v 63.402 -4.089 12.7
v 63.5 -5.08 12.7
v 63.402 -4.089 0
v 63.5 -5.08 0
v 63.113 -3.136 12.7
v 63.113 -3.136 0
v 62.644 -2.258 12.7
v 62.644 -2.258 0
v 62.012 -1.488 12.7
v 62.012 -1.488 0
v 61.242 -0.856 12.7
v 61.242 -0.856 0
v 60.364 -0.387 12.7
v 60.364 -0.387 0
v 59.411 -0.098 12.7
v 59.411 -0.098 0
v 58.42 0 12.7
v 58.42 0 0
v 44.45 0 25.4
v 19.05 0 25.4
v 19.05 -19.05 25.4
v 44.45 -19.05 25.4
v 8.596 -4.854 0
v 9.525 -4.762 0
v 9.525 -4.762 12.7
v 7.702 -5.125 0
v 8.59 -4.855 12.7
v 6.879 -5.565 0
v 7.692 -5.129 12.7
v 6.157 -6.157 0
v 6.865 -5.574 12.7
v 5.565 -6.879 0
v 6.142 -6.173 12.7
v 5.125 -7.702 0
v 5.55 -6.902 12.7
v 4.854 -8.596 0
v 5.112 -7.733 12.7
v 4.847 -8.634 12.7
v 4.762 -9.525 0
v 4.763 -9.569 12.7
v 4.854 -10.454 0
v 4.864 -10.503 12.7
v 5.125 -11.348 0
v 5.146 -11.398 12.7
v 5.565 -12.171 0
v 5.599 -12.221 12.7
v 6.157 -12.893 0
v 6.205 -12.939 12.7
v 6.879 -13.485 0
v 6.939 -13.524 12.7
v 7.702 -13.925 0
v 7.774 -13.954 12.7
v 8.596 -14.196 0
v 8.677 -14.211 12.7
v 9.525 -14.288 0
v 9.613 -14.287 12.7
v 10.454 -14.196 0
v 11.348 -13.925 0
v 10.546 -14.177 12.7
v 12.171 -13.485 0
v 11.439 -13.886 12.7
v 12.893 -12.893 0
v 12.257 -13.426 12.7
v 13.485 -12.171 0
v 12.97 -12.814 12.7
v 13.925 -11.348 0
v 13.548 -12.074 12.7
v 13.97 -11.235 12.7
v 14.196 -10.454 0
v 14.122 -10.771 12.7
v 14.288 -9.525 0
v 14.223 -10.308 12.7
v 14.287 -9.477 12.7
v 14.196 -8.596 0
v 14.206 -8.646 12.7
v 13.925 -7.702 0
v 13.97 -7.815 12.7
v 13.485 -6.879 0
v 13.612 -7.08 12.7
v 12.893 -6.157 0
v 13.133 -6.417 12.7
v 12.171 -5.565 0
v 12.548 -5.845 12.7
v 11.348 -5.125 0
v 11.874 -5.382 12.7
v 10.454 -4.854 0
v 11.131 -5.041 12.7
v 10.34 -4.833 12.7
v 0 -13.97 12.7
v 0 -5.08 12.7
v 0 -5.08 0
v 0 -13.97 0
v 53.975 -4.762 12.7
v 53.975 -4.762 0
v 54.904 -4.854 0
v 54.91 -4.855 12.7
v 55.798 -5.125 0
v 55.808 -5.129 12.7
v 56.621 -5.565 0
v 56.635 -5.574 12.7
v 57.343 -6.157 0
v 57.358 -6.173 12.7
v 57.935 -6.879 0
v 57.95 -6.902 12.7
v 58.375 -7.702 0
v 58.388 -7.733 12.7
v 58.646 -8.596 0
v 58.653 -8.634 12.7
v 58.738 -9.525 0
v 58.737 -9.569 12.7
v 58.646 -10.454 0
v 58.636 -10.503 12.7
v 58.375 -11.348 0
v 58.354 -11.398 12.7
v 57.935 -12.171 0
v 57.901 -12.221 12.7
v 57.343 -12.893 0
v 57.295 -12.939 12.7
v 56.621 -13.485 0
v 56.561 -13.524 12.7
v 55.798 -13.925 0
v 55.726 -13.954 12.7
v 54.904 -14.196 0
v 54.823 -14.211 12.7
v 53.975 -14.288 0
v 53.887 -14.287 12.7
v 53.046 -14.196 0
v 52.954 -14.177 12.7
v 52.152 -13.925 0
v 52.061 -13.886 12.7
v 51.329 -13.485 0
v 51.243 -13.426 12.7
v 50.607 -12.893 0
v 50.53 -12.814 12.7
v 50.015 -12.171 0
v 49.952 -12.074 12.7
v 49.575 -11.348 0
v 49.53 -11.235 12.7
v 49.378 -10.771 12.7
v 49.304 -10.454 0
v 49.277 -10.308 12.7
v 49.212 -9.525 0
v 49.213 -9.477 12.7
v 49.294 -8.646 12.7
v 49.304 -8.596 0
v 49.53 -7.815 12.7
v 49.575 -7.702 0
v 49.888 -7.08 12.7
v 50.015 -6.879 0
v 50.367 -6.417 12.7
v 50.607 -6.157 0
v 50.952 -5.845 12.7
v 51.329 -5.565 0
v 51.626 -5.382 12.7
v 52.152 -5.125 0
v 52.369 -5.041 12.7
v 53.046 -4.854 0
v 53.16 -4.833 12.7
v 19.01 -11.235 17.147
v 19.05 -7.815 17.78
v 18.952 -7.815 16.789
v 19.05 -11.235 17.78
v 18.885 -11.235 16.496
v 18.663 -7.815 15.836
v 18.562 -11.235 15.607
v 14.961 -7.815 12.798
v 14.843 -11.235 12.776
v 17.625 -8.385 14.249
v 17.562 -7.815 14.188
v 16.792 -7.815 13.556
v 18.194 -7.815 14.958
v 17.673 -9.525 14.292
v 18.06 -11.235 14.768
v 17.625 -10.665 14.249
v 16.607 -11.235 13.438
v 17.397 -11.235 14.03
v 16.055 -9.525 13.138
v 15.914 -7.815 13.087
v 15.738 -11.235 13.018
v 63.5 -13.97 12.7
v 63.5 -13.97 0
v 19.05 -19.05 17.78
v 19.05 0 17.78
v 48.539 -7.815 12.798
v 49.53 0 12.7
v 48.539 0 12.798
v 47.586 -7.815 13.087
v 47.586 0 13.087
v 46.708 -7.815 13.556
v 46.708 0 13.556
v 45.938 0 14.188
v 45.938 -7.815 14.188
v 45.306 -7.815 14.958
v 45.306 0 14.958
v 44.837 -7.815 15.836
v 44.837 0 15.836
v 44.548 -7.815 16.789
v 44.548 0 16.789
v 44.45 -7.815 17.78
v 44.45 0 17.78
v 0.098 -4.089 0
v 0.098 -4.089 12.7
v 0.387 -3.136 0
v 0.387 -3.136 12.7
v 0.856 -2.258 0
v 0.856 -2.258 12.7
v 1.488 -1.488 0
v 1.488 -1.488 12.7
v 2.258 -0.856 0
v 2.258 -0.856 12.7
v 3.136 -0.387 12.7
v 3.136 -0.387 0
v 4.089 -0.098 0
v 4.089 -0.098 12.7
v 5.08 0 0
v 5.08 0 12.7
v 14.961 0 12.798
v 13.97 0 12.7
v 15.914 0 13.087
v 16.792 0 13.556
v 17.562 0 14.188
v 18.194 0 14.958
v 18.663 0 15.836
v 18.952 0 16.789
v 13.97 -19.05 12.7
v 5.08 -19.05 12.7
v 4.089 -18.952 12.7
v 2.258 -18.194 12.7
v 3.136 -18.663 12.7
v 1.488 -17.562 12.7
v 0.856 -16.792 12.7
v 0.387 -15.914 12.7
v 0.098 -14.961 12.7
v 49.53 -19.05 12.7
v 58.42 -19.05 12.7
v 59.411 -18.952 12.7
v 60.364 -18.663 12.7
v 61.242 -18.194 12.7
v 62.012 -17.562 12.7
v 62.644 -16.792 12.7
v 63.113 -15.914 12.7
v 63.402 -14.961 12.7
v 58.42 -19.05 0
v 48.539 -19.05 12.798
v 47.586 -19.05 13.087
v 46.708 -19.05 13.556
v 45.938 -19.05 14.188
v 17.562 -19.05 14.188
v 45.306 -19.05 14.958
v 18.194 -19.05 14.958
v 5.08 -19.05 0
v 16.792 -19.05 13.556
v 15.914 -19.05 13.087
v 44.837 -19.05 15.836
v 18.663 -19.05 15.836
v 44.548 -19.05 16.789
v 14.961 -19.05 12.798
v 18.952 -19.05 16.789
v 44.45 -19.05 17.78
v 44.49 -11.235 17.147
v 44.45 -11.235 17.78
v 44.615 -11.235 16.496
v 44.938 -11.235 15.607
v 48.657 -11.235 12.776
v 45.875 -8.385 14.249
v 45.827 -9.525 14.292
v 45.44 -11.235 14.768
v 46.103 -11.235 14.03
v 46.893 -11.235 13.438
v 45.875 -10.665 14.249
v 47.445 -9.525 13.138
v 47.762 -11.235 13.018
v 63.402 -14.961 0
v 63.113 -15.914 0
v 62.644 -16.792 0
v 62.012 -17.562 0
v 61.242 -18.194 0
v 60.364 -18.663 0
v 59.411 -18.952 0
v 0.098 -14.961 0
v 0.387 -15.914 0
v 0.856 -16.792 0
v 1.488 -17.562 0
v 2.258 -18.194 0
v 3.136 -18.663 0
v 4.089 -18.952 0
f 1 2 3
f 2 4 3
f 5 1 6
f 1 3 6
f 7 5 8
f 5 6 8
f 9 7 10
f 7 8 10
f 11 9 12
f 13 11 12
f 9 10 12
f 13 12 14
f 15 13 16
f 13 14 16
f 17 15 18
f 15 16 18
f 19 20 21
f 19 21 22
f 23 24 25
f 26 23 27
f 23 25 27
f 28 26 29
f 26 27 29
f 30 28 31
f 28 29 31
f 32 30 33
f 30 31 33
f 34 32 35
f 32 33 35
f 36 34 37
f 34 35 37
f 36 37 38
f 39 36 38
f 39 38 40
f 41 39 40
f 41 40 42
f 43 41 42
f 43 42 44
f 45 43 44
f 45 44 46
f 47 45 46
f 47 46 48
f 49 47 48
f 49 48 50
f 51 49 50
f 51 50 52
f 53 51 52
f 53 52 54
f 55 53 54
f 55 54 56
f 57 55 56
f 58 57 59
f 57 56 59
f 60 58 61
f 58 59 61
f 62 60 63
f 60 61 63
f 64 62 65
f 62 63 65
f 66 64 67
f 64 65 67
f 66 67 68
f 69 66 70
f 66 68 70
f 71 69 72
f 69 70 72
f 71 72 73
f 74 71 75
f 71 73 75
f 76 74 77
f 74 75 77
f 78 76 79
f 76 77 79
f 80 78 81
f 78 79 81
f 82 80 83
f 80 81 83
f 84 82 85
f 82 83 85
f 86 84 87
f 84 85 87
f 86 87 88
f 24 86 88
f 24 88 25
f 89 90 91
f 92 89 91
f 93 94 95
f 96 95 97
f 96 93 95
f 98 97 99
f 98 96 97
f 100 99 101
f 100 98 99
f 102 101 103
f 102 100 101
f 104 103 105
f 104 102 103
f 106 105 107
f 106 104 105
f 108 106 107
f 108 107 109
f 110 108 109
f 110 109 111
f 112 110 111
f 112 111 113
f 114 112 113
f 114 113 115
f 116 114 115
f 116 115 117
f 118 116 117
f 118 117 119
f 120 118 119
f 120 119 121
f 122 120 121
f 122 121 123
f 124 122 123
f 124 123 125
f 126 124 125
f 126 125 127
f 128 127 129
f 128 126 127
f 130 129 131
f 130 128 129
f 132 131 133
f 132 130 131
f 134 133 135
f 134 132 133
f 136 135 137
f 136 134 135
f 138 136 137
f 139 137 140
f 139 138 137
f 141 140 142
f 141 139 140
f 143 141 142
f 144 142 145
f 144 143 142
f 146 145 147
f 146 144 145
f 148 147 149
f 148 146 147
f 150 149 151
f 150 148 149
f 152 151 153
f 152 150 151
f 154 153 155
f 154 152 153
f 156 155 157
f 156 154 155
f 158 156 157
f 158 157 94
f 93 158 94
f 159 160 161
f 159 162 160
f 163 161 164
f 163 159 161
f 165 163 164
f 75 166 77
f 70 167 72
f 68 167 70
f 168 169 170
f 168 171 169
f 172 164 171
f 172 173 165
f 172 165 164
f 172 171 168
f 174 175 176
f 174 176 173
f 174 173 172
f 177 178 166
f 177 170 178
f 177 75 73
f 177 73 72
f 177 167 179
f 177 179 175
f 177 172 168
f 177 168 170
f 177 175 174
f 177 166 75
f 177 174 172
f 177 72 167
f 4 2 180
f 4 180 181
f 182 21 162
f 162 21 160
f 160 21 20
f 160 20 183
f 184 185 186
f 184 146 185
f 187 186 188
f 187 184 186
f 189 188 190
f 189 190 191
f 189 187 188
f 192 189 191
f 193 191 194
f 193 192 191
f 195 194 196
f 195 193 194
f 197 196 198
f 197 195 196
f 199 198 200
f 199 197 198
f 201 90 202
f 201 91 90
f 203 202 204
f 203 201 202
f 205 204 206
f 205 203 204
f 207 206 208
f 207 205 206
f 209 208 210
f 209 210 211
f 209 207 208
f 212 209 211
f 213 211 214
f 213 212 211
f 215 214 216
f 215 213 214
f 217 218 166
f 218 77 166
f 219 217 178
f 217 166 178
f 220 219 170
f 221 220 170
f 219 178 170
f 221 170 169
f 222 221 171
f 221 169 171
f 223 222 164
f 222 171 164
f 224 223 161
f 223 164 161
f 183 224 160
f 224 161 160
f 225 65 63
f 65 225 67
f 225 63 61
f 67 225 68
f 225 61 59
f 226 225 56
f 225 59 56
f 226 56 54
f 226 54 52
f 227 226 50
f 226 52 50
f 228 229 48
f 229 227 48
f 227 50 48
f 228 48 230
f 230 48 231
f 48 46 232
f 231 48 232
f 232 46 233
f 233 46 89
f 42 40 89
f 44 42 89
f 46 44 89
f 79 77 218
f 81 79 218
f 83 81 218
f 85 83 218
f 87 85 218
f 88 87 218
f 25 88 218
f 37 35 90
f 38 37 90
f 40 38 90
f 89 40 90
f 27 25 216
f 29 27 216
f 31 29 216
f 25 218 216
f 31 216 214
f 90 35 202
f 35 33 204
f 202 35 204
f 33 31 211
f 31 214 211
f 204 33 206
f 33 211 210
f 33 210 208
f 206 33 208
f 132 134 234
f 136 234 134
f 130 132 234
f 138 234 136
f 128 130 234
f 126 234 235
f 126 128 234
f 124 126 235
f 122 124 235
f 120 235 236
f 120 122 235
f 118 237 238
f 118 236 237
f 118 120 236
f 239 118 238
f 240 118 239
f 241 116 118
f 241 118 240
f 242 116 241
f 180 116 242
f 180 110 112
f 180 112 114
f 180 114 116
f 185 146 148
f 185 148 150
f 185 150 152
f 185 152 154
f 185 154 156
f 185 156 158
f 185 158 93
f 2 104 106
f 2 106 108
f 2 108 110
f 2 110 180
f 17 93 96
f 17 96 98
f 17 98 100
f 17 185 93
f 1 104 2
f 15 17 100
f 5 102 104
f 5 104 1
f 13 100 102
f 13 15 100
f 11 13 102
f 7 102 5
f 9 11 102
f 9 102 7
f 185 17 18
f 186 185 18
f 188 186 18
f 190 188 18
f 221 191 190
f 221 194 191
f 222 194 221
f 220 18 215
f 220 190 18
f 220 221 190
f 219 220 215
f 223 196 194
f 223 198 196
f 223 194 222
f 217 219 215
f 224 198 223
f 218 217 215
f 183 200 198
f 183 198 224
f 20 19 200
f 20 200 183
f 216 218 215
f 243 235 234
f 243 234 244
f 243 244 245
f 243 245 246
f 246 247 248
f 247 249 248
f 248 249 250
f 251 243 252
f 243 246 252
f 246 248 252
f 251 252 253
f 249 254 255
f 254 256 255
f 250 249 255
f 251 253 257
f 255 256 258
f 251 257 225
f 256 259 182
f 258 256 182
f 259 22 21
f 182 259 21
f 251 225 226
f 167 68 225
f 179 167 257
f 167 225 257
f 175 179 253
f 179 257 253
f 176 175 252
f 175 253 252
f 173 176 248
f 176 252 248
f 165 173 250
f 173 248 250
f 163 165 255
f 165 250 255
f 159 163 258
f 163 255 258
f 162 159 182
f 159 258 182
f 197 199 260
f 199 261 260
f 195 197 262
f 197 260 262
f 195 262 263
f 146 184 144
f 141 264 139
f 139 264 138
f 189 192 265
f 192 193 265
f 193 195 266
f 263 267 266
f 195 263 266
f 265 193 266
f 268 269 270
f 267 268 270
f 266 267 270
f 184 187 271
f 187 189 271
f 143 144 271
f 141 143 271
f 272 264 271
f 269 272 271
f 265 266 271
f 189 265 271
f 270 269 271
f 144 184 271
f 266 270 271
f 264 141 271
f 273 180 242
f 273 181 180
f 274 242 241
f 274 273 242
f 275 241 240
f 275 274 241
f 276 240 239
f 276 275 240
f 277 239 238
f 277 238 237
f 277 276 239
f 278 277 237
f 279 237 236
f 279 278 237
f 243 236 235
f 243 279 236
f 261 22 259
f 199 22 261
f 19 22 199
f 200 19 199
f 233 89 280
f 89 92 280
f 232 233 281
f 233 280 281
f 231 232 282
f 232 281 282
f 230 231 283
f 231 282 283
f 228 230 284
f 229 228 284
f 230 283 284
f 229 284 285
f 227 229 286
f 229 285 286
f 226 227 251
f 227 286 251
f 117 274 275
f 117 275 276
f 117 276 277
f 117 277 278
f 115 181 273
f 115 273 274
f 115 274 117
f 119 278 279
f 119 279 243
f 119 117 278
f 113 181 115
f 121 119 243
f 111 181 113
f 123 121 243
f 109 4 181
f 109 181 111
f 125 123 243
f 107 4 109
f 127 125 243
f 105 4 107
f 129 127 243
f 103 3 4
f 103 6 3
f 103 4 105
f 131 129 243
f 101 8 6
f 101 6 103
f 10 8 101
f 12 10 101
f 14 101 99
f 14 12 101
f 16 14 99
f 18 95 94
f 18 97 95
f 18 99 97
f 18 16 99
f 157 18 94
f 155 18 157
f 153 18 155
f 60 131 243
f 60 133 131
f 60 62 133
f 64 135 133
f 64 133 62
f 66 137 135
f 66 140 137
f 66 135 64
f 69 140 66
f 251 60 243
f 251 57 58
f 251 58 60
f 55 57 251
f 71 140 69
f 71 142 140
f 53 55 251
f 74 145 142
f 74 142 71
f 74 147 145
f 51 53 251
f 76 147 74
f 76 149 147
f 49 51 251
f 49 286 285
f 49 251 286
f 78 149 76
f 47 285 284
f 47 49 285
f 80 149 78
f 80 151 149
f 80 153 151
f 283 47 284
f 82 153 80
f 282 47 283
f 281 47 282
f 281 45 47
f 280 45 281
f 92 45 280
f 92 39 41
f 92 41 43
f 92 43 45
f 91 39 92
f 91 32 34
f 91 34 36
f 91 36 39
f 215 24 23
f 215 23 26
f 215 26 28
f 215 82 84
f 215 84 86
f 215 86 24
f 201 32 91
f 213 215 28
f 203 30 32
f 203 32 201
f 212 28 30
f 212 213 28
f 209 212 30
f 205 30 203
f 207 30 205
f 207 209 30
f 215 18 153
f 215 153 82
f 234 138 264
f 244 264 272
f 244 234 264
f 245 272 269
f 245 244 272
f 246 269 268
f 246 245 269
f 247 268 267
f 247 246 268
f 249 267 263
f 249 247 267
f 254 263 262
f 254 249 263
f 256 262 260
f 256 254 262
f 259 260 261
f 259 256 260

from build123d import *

# Parameters (mm, degrees)
F1_DEPTH = 19.05
F3_DEPTH = 25.4
F4_R     = 5.08


with BuildPart() as f1:
    # F0 (on Front) → F1 (new body)
    with BuildSketch(Plane.XZ):
        Polygon((0, 12.7), (0, 0), (31.75, 0), (31.75, 25.4), (19.05, 25.4), (19.05, 12.7), align=None)
    extrude(amount=F1_DEPTH)

    # F2 (on face) → F3 (cut)
    with BuildSketch(Plane.XY.offset(12.7)):
        with BuildLine():
            ThreePointArc((14.2875, -9.525), (12.8925960454, -6.1574039546), (9.525, -4.7625))
            Line((9.525, -4.7625), (9.525, -9.525))
            Line((9.525, -9.525), (4.7625, -9.525))
            ThreePointArc((4.7625, -9.525), (9.525, -14.2875), (14.2875, -9.525))
        make_face()
        with BuildLine():
            Line((9.525, -9.525), (9.525, -4.7625))
            ThreePointArc((9.525, -4.7625), (6.1574039546, -6.1574039546), (4.7625, -9.525))
            Line((4.7625, -9.525), (9.525, -9.525))
        make_face()
    extrude(amount=-F3_DEPTH, mode=Mode.SUBTRACT)

    # F4
    f4_edges = [f1.edges().sort_by_distance(p)[0] for p in [
        (0, -19.05, 6.35),
        (0, 0, 6.35),
        (19.05, -9.525, 12.7),
    ]]
    fillet(f4_edges, radius=F4_R)

    # F5: F1 across face


with BuildPart() as f1_1:
    add(f1.part)
    add(f1.part.mirror(Plane(origin=(31.75, -9.525, 12.7), x_dir=(0, 1, 0), z_dir=(1, 0, 0))))


solid = f1_1.part
